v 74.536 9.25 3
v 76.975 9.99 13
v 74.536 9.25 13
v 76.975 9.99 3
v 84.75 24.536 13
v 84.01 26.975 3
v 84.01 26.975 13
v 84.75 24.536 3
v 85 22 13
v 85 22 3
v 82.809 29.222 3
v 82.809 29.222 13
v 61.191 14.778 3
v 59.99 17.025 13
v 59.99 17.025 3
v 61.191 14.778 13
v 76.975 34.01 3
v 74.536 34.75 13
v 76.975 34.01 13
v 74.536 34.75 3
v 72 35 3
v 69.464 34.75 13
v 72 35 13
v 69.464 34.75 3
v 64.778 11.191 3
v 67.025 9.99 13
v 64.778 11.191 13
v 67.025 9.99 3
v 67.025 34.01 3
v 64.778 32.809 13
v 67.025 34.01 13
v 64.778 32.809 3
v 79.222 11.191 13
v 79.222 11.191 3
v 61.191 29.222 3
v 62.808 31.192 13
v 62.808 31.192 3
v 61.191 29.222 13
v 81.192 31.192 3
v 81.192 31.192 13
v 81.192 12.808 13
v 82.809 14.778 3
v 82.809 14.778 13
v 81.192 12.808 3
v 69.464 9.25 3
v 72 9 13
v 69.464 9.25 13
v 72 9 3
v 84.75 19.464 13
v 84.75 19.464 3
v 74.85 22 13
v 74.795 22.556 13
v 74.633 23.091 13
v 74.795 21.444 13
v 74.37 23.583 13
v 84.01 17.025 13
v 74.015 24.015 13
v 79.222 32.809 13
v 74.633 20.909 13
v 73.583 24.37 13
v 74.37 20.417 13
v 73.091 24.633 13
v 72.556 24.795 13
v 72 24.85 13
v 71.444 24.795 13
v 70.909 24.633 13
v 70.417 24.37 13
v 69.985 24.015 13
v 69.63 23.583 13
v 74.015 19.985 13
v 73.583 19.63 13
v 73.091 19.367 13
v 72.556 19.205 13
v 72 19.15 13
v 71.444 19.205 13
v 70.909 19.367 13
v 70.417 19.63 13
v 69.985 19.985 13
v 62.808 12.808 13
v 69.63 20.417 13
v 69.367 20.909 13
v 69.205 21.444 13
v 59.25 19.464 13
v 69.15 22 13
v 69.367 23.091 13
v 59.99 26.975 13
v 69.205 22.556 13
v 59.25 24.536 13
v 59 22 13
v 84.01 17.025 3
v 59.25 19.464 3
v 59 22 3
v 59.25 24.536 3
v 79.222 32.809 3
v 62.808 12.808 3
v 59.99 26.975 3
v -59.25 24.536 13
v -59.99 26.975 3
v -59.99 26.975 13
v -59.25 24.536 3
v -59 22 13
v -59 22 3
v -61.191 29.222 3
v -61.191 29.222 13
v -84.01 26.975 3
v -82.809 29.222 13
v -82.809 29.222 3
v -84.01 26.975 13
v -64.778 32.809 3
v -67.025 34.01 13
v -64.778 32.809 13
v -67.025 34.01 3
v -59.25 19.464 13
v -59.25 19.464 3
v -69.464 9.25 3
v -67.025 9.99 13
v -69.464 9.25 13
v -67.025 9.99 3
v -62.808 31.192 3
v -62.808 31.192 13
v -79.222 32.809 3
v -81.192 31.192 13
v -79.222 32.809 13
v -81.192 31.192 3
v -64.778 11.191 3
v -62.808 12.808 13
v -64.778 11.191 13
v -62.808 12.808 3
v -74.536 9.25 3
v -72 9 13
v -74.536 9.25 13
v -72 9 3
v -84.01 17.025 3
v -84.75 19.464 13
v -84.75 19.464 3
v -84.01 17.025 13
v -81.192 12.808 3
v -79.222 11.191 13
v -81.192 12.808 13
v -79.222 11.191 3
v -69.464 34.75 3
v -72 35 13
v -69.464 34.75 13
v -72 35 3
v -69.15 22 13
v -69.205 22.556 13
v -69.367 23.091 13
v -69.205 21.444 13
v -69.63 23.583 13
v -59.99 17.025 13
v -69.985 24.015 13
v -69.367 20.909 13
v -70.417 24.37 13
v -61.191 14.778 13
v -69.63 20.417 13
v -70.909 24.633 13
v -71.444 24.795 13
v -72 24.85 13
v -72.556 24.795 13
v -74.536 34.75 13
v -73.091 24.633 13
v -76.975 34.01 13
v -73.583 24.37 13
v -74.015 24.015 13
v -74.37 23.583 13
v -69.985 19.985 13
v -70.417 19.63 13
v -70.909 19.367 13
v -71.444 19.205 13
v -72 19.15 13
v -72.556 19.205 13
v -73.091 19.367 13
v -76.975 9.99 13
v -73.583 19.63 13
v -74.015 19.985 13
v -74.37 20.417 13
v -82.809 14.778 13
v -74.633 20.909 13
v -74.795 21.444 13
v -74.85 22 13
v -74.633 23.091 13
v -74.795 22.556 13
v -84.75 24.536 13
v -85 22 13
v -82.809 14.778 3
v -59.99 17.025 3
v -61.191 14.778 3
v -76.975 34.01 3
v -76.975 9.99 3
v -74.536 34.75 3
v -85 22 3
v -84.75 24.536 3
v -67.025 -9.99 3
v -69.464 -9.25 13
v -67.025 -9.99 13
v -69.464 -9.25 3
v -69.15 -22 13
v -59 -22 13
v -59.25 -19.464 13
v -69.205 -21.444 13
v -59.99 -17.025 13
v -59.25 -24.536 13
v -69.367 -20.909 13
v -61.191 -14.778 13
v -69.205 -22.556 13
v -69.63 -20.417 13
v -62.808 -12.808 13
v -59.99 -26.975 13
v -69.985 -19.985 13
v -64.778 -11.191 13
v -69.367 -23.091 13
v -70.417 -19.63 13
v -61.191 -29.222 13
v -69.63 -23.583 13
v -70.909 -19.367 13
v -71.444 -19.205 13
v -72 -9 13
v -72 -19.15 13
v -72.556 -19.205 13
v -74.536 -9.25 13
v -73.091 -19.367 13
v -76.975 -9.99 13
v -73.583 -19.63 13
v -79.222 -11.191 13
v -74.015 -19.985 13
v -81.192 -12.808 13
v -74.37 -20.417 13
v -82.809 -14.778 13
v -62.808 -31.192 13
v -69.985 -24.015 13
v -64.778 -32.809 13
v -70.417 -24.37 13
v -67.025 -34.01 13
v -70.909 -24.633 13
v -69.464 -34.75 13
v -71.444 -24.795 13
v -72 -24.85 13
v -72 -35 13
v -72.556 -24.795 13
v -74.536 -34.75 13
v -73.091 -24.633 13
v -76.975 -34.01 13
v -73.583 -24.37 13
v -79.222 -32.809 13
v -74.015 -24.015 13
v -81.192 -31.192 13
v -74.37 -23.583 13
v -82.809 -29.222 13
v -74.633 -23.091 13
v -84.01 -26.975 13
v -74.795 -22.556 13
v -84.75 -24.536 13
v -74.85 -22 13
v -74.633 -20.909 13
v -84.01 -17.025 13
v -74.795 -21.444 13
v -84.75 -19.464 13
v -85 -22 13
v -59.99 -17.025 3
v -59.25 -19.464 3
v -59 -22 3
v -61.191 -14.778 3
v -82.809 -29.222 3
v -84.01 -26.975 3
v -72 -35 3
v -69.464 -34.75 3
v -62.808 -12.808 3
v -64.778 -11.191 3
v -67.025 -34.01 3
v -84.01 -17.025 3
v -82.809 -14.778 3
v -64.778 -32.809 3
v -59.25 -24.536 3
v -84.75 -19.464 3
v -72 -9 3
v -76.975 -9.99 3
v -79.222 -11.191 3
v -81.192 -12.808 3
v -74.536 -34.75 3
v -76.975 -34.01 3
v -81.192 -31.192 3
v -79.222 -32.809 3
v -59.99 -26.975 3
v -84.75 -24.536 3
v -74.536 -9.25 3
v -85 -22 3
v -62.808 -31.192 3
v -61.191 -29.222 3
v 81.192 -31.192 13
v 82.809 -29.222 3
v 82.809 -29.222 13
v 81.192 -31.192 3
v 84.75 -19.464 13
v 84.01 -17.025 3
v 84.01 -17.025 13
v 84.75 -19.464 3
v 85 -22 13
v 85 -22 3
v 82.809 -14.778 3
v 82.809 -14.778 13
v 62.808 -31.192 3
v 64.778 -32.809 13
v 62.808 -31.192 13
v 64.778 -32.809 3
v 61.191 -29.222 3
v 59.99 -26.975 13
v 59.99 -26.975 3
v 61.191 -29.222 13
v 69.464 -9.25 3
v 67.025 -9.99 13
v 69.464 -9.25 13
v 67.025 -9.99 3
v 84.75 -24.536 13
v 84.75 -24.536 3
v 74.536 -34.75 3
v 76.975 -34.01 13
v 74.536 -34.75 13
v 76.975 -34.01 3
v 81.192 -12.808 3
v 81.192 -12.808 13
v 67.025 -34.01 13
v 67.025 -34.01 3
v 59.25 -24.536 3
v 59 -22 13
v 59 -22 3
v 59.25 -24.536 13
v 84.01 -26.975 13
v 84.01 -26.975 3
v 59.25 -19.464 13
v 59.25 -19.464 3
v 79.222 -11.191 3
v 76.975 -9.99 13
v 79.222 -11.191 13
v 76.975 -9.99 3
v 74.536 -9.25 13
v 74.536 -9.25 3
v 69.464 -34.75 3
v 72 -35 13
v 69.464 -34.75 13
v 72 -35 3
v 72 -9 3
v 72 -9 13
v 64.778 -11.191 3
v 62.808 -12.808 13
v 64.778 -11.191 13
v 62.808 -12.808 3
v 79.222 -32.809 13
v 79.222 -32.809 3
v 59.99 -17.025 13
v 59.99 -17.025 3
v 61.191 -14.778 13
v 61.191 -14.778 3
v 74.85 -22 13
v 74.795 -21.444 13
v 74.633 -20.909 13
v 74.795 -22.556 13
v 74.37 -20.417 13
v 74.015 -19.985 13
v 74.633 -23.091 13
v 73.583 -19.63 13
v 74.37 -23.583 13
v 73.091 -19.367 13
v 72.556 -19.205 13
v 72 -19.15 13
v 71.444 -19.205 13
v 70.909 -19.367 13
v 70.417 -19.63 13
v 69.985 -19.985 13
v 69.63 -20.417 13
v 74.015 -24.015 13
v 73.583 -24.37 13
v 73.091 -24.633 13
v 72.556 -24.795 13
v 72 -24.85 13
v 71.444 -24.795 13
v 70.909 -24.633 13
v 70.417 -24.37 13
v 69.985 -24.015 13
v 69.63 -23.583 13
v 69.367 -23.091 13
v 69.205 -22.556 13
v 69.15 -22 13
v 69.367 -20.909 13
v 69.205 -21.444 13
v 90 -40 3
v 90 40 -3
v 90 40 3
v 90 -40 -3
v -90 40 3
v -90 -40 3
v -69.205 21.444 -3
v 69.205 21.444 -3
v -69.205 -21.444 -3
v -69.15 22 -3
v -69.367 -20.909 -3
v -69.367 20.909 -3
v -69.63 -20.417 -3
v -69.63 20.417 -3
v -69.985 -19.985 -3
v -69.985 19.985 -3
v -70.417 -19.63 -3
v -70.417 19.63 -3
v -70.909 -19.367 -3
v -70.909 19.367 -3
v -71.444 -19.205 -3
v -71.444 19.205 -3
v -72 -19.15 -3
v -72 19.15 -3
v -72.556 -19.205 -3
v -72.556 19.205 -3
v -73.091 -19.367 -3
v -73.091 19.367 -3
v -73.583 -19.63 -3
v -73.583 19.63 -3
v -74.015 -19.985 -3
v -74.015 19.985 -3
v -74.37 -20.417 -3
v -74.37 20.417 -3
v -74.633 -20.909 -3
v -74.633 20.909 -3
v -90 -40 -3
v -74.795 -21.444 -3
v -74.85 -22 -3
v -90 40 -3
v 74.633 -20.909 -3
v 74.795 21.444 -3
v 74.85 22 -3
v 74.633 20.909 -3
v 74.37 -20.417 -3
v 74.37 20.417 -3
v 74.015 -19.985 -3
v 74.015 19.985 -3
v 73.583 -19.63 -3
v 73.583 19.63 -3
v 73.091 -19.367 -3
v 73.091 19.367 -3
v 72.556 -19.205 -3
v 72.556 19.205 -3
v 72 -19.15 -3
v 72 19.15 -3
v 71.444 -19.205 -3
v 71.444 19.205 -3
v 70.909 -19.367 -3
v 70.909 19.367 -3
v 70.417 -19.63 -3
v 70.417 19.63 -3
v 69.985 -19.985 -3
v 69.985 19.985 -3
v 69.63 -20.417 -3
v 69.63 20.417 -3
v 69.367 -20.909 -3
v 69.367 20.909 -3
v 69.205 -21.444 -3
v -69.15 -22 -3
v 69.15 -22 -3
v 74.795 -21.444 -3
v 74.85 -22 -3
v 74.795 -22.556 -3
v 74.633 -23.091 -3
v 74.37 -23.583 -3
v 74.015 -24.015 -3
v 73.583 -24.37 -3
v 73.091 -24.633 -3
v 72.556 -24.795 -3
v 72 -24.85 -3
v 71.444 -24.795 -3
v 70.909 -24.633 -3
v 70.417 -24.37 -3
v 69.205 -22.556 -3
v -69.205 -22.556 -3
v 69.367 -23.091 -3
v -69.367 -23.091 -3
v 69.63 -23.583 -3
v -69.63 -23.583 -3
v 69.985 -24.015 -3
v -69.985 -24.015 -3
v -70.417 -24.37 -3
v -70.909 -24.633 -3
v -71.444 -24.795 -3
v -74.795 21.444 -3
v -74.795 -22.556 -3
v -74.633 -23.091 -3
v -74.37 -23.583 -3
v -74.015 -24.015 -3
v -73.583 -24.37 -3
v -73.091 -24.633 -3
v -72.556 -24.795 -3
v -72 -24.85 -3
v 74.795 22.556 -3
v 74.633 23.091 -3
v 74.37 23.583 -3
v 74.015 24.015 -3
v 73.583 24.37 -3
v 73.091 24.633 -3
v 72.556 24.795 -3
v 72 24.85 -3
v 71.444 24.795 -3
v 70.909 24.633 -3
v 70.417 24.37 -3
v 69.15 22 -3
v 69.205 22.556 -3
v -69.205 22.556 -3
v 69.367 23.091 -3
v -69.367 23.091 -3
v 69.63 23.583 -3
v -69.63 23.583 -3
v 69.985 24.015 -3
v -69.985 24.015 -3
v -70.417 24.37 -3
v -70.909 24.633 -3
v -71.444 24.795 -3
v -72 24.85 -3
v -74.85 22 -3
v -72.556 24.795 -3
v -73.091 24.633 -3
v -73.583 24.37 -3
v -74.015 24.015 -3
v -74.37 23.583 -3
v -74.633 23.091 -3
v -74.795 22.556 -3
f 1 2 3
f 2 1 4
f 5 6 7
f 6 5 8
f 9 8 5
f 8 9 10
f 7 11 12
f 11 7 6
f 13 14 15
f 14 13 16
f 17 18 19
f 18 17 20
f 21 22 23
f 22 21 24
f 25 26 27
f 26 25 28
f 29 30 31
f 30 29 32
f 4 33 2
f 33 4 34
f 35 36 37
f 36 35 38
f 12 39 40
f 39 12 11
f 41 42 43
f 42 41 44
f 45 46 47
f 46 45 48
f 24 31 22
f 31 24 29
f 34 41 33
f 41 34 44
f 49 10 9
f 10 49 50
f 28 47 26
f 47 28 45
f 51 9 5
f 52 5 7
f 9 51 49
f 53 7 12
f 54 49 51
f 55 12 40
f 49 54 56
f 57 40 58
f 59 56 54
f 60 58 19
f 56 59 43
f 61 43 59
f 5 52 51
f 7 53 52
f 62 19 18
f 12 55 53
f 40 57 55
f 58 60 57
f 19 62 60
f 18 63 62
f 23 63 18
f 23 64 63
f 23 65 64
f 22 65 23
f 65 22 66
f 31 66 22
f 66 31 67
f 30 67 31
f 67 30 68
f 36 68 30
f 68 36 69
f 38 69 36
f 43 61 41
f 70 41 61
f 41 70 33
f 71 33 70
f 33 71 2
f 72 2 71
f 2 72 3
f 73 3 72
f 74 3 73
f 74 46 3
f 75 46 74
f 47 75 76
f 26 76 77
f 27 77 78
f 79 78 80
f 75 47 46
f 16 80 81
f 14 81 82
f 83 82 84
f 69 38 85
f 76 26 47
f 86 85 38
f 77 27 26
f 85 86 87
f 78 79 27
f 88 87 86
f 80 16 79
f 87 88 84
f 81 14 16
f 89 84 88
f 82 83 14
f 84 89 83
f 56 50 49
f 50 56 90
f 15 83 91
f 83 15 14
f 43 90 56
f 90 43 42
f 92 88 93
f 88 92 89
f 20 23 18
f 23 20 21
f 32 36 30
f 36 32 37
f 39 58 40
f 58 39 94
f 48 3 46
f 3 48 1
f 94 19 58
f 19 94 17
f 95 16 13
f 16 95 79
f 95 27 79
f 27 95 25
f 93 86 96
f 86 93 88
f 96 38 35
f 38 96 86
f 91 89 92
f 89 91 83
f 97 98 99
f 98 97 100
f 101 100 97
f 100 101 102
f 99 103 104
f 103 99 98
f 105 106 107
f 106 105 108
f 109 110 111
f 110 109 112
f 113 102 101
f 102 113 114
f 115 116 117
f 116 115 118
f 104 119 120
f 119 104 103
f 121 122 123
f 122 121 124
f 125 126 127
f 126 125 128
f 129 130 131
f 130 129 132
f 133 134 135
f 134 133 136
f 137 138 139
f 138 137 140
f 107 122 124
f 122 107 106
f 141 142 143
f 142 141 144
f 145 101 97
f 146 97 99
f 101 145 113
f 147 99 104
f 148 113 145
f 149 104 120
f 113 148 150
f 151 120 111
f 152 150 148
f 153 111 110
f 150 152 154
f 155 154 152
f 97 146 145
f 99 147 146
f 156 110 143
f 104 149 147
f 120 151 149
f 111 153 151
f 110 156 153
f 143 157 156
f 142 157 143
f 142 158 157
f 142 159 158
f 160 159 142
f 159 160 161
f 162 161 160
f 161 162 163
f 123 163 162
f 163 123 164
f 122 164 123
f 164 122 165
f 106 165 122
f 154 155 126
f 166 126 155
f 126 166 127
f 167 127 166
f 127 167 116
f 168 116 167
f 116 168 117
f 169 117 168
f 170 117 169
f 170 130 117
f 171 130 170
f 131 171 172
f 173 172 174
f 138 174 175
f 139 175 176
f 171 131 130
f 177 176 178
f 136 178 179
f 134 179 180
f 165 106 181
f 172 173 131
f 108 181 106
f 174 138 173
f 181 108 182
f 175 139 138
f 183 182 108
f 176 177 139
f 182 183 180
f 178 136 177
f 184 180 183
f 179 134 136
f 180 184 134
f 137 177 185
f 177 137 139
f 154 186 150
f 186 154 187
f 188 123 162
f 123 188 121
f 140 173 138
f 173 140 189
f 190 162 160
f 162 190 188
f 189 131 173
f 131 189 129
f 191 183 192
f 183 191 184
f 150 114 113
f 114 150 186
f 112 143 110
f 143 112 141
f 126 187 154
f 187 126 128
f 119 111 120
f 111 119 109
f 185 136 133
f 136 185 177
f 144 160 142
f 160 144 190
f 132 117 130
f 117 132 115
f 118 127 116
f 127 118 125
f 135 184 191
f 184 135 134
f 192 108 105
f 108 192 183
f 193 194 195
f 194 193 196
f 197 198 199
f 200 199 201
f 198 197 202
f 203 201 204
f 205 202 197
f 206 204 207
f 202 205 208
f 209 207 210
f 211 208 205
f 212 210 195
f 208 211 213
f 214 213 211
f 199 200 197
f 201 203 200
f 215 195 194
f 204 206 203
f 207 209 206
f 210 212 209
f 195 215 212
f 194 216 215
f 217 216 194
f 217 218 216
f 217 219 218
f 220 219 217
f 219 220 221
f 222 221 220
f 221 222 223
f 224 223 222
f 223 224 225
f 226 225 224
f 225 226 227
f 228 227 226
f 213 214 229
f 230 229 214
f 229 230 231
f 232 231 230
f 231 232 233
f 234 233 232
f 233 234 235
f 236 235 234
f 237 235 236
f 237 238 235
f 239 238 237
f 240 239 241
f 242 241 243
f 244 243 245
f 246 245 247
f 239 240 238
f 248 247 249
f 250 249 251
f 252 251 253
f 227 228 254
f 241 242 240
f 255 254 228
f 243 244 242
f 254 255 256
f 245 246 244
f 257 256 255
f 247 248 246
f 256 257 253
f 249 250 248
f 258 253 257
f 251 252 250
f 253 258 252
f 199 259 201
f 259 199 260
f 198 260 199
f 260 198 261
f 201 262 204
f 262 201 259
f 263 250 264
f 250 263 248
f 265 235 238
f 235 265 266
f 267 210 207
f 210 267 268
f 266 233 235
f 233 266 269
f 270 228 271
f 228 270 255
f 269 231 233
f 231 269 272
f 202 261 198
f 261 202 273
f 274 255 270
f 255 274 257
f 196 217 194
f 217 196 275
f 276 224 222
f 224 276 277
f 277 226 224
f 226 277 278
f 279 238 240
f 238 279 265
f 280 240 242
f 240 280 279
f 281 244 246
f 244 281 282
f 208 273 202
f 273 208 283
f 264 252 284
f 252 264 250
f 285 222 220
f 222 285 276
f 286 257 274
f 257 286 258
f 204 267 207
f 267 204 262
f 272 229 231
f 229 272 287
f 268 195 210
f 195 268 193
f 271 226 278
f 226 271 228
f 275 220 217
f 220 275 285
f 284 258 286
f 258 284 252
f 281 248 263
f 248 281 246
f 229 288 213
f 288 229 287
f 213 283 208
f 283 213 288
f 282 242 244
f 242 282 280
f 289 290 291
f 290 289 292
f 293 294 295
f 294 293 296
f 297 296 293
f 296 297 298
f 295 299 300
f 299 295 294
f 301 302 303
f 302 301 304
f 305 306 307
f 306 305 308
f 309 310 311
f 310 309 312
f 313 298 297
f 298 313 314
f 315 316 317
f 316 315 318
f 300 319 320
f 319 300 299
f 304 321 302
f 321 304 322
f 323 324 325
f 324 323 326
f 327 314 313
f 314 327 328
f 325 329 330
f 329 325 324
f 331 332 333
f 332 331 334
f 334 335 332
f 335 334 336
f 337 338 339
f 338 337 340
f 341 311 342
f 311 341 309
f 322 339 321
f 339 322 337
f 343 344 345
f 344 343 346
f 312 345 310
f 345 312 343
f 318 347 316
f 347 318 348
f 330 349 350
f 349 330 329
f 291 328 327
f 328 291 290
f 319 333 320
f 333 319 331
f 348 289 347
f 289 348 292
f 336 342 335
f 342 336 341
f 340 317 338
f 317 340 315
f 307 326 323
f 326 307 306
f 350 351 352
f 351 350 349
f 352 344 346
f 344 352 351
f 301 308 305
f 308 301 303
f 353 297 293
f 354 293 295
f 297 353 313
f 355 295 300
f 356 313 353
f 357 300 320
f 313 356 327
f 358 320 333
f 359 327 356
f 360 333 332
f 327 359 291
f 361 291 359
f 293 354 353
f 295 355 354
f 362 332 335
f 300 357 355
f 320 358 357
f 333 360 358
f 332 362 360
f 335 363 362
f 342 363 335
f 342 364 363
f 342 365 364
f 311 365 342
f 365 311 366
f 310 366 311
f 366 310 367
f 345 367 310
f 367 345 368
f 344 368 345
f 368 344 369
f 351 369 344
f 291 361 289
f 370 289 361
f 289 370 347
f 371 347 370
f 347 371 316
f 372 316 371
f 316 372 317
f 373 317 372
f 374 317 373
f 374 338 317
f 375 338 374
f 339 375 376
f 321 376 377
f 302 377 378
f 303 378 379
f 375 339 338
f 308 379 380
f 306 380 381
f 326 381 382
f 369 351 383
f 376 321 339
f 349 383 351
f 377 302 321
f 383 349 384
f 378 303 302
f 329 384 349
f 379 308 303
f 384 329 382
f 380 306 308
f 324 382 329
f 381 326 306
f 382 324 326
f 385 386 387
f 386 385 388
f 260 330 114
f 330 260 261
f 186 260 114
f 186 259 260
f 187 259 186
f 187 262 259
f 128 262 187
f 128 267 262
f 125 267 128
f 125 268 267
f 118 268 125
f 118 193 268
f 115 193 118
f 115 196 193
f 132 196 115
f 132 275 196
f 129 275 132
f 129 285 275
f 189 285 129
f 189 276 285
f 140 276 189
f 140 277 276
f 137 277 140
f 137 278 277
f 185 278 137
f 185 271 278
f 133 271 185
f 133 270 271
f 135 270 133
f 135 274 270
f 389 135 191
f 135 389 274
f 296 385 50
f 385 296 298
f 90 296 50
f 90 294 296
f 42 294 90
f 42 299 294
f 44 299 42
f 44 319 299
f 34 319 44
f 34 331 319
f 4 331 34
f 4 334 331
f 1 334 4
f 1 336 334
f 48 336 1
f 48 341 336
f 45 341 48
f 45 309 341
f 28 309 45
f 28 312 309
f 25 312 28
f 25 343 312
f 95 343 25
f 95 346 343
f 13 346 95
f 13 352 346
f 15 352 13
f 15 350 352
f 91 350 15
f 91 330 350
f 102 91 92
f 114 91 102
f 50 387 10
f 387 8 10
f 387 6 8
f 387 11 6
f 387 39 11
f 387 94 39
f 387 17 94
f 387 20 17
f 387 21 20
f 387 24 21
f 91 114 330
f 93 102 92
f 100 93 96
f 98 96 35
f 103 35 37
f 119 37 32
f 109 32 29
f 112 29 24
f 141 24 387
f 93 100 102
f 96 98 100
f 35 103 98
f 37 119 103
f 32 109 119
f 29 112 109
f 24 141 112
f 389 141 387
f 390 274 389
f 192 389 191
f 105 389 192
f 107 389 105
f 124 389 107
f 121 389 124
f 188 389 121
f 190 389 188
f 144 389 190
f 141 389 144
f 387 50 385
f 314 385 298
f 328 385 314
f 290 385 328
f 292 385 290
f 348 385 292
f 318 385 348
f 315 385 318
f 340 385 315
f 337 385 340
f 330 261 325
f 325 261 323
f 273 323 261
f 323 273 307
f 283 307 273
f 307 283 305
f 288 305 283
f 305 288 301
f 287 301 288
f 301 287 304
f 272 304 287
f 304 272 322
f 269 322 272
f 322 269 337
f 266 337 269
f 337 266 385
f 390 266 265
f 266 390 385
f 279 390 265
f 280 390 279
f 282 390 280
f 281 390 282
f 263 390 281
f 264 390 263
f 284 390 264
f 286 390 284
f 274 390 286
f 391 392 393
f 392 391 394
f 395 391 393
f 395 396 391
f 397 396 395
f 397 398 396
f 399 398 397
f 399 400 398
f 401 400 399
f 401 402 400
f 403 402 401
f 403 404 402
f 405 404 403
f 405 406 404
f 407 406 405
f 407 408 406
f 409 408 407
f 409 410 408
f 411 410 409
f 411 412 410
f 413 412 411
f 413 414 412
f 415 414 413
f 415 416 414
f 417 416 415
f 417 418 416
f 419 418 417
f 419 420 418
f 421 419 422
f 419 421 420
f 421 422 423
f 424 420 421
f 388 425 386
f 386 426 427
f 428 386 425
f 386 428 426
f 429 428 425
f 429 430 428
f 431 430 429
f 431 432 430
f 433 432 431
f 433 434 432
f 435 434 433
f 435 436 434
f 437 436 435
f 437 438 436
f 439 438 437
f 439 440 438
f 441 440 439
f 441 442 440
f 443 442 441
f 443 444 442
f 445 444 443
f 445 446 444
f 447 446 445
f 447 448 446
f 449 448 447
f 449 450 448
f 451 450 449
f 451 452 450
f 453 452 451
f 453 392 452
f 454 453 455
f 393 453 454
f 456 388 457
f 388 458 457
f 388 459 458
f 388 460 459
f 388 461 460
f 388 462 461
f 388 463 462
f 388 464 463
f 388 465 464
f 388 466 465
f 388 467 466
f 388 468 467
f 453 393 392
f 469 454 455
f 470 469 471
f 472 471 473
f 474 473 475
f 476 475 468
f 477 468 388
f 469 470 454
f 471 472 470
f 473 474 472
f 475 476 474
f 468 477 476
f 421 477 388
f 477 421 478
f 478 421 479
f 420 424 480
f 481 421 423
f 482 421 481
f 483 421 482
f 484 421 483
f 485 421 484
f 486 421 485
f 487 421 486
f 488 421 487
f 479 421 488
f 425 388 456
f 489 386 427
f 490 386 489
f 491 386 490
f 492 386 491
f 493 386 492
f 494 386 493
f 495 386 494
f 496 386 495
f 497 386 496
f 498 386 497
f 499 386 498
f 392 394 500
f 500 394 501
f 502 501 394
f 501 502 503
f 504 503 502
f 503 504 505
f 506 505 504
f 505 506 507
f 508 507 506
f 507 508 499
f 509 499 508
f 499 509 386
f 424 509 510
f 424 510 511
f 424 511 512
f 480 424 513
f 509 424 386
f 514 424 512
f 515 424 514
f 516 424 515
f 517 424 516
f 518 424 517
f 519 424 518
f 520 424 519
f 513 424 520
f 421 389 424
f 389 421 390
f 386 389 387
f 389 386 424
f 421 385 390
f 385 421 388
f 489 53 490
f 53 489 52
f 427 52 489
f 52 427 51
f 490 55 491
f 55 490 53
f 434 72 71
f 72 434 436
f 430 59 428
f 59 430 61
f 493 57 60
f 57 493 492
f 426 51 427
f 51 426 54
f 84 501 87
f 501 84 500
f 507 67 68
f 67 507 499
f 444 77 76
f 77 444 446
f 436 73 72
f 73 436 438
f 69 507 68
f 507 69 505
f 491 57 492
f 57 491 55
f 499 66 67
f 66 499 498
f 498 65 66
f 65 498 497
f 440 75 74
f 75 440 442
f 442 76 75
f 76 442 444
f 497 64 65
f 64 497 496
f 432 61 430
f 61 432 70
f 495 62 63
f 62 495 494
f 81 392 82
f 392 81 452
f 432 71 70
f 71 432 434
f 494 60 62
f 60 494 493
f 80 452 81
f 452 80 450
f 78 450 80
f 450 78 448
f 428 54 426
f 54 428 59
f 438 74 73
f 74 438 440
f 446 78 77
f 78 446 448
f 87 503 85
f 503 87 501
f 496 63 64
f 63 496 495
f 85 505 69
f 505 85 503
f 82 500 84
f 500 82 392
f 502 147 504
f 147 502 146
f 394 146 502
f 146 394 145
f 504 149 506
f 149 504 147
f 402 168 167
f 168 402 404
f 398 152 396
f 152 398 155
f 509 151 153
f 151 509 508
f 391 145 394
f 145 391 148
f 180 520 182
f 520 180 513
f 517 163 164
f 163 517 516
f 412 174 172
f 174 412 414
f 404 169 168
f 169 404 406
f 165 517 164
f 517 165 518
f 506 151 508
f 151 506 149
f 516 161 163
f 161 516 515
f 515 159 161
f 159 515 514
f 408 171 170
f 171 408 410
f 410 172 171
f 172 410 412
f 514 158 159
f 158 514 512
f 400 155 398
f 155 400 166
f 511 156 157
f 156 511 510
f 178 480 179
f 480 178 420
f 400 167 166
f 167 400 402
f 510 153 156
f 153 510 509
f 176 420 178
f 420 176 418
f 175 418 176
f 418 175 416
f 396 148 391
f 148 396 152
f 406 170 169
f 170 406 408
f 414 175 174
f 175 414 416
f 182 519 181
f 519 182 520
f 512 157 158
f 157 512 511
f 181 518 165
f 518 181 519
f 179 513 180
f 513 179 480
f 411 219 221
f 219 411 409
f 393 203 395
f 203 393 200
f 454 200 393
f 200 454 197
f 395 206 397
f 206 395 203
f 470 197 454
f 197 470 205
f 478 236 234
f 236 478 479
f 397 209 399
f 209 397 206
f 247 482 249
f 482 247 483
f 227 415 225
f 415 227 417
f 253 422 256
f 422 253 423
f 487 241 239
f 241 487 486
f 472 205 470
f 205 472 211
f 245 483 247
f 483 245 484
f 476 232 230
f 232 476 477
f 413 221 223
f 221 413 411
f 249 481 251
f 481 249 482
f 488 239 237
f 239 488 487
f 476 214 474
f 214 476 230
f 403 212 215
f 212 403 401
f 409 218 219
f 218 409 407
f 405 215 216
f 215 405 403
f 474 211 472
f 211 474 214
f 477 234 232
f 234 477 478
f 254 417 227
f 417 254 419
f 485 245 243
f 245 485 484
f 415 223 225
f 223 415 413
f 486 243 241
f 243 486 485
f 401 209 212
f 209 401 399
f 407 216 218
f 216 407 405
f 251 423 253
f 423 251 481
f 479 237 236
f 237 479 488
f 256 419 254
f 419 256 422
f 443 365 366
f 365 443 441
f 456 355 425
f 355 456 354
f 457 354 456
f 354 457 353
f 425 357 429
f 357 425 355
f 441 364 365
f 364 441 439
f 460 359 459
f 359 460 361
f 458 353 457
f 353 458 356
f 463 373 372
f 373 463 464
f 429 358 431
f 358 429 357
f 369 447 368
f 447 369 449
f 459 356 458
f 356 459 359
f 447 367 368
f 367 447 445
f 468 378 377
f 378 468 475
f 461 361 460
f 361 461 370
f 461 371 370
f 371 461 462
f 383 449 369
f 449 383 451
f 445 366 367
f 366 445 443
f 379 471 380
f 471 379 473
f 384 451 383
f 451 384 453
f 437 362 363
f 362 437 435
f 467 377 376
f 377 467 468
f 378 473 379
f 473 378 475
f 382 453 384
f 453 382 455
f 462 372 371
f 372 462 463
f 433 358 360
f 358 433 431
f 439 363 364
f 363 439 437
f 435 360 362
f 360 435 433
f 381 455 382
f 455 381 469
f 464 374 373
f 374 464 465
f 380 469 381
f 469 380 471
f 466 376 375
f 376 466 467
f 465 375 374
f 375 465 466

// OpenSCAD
$fn = 32;

// ----------------------------------------------------------------------
// Anchor pads 180 x 80 x 16
// four corner bosses with anchor holes
// ----------------------------------------------------------------------

// --- parameters (mm) ---
plate = [180, 80, 6];   // base plate size (x, y, z)
pads = 4;               // boss count, one per corner
edge = 18;              // boss centre offset from the plate edge
boss_d = 26;            // boss diameter
boss_h = 10;            // boss height above the base plate
bore_d = 5.5;           // nominal hole diameter from the drawing
print_allowance = 0.2;  // clearance added for printing

// --- derived feature positions (mm) ---
hole_d = bore_d + print_allowance;  // = 5.7   hole diameter as printed
height = plate[2] + boss_h;         // = 16   overall height of the part
corner_x = plate[0] / 2 - edge;     // = 72   boss centre X
corner_y = plate[1] / 2 - edge;     // = 22   boss centre Y
feature_centers = [
  [corner_x, corner_y],
  [-corner_x, corner_y],
  [-corner_x, -corner_y],
  [corner_x, -corner_y]
];   // boss centres, anchor holes are drilled there

// base plate, four bosses standing on it, anchor holes all the way through
difference() {
  union() {
    cube(plate, center = true);
    for (centre = feature_centers)
      translate([centre[0], centre[1], plate[2] / 2 - 1])
        cylinder(d = boss_d, h = boss_h + 1);
  }
  for (centre = feature_centers)
    translate([centre[0], centre[1], -height])
      cylinder(d = hole_d, h = 2 * height + 2);  // through boss and plate
}
